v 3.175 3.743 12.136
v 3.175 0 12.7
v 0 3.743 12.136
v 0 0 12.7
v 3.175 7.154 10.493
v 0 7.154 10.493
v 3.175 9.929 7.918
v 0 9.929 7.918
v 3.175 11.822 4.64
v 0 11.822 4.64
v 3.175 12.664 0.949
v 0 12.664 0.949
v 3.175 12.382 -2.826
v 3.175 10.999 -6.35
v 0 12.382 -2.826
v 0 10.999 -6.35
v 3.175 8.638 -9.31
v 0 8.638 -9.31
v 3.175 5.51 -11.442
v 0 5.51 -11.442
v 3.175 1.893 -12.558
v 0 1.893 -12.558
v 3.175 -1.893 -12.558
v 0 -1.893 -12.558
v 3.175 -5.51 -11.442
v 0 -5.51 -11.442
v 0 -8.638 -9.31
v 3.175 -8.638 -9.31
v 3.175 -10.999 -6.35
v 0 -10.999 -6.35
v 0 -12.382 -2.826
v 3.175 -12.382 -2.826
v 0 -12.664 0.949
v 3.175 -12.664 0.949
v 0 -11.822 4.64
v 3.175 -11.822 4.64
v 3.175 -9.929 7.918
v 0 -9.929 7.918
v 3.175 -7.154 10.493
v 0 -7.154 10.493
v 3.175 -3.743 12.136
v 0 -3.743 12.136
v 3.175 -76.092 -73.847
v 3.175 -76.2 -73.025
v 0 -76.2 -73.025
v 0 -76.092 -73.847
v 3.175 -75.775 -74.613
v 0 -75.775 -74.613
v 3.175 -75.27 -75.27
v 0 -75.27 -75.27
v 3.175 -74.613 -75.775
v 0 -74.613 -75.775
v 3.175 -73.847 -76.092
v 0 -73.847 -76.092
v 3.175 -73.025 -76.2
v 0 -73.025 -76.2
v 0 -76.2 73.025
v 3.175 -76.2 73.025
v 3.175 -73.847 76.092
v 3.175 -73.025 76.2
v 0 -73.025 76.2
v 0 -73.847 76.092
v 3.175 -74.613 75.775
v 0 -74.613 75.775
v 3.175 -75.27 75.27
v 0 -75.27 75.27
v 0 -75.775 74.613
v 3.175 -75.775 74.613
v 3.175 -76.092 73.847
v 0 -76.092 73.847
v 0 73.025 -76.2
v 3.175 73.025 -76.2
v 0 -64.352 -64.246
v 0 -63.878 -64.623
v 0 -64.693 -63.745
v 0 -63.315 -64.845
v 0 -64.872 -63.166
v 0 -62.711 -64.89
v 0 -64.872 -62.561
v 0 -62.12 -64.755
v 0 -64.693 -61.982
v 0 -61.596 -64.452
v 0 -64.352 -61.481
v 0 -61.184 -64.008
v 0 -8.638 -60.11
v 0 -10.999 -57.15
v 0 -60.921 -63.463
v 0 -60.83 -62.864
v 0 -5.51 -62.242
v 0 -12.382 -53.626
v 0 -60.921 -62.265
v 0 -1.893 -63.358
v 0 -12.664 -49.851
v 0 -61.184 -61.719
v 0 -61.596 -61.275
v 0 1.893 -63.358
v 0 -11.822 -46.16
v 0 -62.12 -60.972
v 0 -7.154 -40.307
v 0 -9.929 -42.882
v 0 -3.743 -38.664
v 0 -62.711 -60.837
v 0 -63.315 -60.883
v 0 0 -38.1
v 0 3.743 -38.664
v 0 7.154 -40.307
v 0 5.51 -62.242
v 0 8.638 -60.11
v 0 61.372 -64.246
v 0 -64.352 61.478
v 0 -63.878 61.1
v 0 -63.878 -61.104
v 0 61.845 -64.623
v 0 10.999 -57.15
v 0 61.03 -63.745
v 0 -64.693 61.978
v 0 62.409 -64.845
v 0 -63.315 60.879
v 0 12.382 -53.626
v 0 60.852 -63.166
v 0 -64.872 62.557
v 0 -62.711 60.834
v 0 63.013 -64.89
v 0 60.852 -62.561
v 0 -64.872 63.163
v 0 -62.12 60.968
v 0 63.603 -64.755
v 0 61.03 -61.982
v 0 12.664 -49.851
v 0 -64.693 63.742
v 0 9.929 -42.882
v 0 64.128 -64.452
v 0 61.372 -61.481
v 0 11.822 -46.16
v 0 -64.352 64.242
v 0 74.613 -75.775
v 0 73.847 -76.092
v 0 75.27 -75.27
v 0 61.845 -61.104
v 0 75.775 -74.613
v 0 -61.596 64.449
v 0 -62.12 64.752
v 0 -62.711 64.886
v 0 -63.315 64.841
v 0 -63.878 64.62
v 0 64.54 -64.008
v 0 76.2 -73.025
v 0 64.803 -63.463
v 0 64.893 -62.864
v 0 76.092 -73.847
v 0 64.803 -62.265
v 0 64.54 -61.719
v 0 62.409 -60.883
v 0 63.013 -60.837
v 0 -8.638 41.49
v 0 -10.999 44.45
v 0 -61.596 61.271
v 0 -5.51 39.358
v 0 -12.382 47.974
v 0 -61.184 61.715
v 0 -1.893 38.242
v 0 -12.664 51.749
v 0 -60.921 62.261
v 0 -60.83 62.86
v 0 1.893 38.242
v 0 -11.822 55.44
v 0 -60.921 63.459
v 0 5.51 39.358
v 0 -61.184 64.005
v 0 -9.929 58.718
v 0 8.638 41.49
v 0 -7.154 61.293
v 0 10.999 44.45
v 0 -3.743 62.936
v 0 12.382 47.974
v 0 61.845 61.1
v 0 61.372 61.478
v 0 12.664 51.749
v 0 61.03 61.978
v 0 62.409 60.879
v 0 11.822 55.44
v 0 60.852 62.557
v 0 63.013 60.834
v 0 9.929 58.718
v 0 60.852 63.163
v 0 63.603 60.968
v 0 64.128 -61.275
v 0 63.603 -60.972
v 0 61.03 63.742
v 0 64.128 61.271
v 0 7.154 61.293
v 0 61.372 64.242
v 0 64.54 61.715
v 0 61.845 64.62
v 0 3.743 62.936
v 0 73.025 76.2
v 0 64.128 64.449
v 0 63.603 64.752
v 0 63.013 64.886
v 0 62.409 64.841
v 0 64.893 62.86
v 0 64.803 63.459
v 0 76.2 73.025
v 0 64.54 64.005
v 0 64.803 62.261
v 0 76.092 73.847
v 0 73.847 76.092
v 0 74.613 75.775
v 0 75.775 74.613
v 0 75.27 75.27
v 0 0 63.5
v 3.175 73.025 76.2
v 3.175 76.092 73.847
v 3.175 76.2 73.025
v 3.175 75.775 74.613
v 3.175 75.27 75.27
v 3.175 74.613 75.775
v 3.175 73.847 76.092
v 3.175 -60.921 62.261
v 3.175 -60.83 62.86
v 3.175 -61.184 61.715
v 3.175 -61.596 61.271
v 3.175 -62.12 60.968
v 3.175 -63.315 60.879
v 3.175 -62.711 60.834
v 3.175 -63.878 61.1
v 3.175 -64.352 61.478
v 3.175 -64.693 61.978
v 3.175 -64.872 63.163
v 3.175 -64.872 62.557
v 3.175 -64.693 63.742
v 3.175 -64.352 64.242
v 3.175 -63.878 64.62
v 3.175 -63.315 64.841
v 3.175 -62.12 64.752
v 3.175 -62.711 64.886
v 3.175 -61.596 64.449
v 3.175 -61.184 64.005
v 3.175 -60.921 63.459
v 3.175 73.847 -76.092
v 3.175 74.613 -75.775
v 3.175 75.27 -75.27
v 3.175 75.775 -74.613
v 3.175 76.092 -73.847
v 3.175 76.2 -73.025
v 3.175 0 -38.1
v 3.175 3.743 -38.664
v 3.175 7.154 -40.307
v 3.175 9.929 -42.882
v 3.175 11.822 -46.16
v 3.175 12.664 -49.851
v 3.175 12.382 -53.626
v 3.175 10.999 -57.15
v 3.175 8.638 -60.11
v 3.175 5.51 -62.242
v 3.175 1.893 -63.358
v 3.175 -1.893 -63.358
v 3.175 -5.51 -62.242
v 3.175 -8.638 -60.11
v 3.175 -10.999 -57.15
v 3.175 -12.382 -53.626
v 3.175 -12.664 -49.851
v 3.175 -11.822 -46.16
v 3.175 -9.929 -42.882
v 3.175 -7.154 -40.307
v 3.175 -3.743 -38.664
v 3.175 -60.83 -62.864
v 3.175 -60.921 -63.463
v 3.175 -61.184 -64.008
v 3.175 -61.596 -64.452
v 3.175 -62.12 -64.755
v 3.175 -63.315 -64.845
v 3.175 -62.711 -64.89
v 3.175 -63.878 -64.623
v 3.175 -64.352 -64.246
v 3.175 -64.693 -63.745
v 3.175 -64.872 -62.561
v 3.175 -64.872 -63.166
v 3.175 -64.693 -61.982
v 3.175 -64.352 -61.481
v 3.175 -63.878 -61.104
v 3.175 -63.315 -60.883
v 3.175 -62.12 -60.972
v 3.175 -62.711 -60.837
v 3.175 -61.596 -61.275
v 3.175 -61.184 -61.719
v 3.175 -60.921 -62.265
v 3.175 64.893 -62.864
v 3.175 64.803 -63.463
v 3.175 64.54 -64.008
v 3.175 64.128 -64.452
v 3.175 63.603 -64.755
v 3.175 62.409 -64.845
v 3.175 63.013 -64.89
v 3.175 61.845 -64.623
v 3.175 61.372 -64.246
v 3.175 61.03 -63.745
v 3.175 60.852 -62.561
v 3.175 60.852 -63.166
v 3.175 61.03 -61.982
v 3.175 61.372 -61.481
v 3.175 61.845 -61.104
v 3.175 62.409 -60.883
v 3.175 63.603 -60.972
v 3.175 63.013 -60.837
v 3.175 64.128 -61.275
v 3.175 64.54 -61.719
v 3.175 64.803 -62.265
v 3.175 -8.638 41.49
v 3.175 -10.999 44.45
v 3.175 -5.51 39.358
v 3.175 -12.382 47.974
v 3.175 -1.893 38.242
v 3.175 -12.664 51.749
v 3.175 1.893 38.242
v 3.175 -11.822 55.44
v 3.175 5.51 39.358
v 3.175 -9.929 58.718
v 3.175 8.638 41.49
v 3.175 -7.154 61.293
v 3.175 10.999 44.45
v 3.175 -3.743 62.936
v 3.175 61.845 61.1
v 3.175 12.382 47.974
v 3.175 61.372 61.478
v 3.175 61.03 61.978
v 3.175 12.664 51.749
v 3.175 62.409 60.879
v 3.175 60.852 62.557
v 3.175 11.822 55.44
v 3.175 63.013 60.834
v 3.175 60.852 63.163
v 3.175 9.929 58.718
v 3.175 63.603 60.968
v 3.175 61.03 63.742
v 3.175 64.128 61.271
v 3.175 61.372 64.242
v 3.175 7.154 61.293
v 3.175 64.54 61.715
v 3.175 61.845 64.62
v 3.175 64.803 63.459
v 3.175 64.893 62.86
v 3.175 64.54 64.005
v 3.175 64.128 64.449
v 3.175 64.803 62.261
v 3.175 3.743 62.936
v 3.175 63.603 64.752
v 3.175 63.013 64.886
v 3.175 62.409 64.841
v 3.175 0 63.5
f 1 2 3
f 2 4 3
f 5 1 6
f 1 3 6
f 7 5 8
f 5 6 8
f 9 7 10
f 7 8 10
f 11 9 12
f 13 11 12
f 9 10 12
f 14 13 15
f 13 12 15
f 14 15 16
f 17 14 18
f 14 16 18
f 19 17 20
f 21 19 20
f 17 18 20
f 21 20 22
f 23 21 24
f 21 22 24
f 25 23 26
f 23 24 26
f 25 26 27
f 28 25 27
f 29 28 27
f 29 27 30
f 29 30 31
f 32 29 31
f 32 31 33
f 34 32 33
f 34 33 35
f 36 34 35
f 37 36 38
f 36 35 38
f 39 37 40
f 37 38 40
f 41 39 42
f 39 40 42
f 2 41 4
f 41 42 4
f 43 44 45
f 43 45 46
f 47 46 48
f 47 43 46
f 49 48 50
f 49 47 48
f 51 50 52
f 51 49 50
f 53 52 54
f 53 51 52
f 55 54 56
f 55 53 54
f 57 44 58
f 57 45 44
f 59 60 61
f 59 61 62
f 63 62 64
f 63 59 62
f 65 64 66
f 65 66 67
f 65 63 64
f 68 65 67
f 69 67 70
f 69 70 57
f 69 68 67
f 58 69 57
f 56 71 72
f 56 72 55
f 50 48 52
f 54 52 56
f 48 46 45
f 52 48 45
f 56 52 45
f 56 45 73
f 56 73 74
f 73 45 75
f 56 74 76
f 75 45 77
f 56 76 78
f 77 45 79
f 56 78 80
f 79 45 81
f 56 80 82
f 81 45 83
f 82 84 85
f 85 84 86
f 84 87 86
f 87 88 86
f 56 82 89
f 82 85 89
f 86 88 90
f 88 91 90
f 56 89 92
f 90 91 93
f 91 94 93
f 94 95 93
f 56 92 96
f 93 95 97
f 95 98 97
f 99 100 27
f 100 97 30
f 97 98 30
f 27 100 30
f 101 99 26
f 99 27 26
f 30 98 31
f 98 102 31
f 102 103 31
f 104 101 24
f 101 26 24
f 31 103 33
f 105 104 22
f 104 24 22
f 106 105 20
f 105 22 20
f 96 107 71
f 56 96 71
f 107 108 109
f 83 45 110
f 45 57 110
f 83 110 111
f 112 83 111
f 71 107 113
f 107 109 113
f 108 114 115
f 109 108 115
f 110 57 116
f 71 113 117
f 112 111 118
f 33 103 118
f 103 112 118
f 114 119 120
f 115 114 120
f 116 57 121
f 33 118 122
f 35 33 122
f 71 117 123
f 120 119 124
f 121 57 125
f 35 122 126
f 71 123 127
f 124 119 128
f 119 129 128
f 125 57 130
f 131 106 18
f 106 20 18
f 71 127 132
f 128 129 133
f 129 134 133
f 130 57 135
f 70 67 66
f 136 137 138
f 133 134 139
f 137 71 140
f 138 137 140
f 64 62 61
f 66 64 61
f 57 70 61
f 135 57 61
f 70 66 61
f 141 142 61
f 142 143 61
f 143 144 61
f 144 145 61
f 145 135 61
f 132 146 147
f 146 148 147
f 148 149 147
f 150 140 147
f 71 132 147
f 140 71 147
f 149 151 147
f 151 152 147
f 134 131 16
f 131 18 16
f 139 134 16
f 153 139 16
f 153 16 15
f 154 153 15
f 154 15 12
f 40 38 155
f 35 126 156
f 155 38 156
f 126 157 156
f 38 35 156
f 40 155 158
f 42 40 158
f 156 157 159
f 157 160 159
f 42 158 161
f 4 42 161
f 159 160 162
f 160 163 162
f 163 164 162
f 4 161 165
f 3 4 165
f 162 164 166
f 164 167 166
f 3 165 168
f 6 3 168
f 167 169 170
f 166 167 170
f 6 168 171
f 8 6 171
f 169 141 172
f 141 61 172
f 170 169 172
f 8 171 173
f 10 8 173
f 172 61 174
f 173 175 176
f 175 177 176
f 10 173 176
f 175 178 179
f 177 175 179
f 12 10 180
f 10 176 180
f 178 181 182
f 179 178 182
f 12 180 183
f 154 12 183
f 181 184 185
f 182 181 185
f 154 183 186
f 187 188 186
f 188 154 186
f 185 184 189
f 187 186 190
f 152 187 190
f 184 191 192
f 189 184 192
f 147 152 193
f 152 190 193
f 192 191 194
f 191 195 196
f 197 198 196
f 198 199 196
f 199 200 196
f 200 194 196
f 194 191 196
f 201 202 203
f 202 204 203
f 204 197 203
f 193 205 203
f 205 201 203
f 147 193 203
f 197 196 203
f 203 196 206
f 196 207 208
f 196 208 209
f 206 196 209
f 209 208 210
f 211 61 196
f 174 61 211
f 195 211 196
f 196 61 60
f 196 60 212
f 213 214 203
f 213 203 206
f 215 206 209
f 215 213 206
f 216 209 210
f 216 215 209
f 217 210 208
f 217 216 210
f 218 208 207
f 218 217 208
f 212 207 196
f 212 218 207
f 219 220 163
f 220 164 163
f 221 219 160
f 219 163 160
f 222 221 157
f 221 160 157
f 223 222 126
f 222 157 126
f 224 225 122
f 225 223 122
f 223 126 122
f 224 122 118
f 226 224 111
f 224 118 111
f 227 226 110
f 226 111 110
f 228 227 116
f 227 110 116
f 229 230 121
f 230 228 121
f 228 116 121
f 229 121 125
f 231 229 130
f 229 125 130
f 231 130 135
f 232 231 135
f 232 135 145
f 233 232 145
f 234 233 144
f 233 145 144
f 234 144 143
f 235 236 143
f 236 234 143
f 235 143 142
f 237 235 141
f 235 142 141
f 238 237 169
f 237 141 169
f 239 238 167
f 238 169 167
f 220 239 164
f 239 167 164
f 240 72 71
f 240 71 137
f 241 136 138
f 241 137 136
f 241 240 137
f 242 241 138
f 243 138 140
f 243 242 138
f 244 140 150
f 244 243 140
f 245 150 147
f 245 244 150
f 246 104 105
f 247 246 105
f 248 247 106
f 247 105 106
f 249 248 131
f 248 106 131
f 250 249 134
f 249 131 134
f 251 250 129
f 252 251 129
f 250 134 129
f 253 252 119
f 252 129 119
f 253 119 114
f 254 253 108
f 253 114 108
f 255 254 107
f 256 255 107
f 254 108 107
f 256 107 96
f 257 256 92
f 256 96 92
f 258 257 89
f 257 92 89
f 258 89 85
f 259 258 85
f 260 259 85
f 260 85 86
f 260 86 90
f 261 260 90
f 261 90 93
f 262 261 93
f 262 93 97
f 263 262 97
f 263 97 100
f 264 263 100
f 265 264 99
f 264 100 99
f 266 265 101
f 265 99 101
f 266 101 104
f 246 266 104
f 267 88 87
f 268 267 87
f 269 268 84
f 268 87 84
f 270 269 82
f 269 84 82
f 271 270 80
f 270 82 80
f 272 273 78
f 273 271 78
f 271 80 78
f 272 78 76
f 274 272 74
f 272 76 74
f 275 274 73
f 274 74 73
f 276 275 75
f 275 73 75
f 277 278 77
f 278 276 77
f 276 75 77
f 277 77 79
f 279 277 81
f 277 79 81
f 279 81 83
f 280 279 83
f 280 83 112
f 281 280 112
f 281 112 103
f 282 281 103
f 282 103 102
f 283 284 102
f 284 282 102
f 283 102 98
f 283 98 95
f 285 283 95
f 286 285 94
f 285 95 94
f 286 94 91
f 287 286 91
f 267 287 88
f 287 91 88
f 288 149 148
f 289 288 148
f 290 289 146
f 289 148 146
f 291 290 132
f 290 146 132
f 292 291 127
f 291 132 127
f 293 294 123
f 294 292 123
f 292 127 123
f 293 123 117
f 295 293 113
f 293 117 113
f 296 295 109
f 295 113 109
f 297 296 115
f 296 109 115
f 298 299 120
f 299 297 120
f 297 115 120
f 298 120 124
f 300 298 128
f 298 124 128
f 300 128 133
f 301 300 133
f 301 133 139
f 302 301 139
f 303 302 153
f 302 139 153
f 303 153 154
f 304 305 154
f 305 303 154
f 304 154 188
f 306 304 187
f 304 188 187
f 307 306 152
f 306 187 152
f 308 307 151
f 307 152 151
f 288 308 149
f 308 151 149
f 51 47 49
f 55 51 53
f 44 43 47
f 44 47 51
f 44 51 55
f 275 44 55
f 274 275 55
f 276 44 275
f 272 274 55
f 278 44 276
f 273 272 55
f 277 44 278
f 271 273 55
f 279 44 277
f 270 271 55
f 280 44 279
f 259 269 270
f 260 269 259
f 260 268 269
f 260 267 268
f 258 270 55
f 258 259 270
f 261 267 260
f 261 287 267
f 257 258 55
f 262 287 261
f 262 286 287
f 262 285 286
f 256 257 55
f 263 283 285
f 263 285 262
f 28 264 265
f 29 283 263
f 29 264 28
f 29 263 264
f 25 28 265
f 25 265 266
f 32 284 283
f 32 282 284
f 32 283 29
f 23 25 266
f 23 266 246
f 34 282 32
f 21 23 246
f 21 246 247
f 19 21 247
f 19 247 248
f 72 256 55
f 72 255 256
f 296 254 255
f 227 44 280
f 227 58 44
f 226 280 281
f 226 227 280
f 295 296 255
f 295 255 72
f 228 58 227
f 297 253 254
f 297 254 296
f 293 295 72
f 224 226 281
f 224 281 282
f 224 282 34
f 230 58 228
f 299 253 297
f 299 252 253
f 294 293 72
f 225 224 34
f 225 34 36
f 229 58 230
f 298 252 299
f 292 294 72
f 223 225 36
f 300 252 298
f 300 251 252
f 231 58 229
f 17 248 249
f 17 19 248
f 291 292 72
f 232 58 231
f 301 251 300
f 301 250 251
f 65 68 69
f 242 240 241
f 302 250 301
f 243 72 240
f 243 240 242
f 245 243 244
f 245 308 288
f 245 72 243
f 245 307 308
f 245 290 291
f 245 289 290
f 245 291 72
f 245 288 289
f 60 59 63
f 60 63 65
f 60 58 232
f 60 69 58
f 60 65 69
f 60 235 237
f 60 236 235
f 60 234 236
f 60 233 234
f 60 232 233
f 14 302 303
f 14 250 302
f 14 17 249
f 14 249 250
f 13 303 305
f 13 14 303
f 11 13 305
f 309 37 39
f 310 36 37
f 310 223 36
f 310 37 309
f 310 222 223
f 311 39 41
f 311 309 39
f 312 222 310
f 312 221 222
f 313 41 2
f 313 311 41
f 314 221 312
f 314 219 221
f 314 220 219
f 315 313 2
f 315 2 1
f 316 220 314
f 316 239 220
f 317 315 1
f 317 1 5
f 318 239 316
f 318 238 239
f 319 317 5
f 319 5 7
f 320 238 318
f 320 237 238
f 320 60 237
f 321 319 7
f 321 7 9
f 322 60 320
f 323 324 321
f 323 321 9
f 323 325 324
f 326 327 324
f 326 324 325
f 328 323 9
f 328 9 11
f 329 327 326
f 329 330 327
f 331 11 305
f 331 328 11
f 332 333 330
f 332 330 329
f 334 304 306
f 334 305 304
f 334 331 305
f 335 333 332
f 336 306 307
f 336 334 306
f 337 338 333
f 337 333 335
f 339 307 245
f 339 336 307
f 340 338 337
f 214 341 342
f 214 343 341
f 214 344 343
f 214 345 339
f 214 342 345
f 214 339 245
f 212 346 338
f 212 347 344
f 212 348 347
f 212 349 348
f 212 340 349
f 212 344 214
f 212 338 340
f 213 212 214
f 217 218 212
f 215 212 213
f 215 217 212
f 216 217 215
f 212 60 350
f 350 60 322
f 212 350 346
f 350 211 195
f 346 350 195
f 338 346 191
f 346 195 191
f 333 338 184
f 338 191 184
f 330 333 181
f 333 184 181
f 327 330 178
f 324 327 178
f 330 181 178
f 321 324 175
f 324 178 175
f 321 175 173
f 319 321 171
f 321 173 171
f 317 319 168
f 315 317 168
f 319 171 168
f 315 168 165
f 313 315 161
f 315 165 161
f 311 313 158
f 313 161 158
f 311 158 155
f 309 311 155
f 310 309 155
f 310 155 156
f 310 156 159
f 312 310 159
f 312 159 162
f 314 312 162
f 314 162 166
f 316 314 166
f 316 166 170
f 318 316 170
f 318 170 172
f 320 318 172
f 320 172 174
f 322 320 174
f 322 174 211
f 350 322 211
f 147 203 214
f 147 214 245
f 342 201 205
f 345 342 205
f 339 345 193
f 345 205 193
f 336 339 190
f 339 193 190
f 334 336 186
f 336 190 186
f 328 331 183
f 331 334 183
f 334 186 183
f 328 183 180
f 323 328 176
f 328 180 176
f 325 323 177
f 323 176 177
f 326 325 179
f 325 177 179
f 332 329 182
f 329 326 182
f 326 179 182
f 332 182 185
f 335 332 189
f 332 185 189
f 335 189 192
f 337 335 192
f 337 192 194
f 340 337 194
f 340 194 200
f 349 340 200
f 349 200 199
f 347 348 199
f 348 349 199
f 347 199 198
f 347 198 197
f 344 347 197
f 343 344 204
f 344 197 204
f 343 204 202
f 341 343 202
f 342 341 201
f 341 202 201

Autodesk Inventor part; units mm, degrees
ref_plane "YZ Plane" through (0, 0, 0) normal (1, 0, 0) x (0, 1, 0)
ref_plane "XZ Plane" through (0, 0, 0) normal (0, 1, 0) x (-1, 0, 0)
ref_plane "XY Plane" through (0, 0, 0) normal (0, 0, 1) x (1, 0, 0)
sketch "Sketch1" plane through (0, 0, 0) normal (1, 0, 0) x (0, 1, 0)
  line L0 (-76.2, 76.2) -> (76.2, 76.2)
  line L1 (76.2, 76.2) -> (76.2, -76.2)
  line L2 (76.2, -76.2) -> (-76.2, -76.2)
  line L3 (-76.2, -76.2) -> (-76.2, 76.2)
  circle A0 centre (62.8611, 62.86) radius 2.032
  circle A1 centre (-62.8625, -62.8636) radius 2.032
  circle A2 centre (-0.0007, -88.9018) radius 2.032
  circle A3 centre (-62.8625, 62.86) radius 2.032
  circle A4 centre (88.8993, -0.0018) radius 2.032
  circle A5 centre (-88.9007, -0.0018) radius 2.032
  circle A6 centre (62.8611, -62.8636) radius 2.032
  circle A7 centre (-0.0007, 88.8982) radius 2.032
  circle A8 centre (-0.0007, -0.0018) radius 6.35
  dimension "d0" = 152.4
  dimension "d1" = 152.4
  dimension "d5" = 12.7
extrude "Extrusion2" add sketch "Sketch1" along normal blind 3.175 contours L0 L1 L2 L3 | A8
fillet "Fillet2" radius 3.175 4 edges at (1.5875, 76.2, 76.2) (1.5875, 76.2, -76.2) (1.5875, -76.2, 76.2) (1.5875, -76.2, -76.2)
sketch "Sketch2" plane through (3.175, 0, 0) normal (1, 0, 0) x (0, 0, -1)
  line L0 (-50.8, -50.8) -> (50.8, -50.8)
  line L1 (50.8, -50.8) -> (50.8, 50.8)
  line L2 (50.8, 50.8) -> (-50.8, 50.8)
  line L3 (-50.8, 50.8) -> (-50.8, -50.8)
  line L4 (-50.8, -50.8) -> (50.8, 50.8) construction
  line L5 (50.8, -50.8) -> (-50.8, 50.8) construction
  circle A0 centre (0, 0) radius 12.7
  line L6 (-12.7, 0) -> (-50.8, 38.1)
  line L7 (0, 12.7) -> (-38.1, 50.8)
  line L8 (-38.1, 50.8) -> (0, 12.7)
  line L9 (38.1, 50.8) -> (0, 12.7)
  line L10 (12.7, 0) -> (50.8, 38.1)
  line L11 (12.7, 0) -> (50.8, -38.1)
  line L12 (0, -12.7) -> (38.1, -50.8)
  line L13 (0, -12.7) -> (-38.1, -50.8)
  line L14 (-12.7, 0) -> (-50.8, -38.1)
  dimension "d9" = 101.6
  dimension "d10" = 101.6
  dimension "d11" = 25.4
extrude "Extrusion3" [suppressed]
fillet "Fillet3" [suppressed]
sketch "Sketch4" plane through (0, 0, 0) normal (-1, 0, 0) x (0, 0, 1)
  circle A0 centre (0, 0) radius 12.7
  circle A1 centre (50.8, 0) radius 12.7
  circle A2 centre (-50.8, 0) radius 12.7
  dimension "d18" = 25.4
  dimension "d21" = 25.4
  dimension "d22" = 25.4
  dimension "d23" = 50.8
  dimension "d24" = 50.8
extrude "Extrusion6" cut sketch "Sketch4" against normal blind 25.4
properties part number "Bottom Plate"
